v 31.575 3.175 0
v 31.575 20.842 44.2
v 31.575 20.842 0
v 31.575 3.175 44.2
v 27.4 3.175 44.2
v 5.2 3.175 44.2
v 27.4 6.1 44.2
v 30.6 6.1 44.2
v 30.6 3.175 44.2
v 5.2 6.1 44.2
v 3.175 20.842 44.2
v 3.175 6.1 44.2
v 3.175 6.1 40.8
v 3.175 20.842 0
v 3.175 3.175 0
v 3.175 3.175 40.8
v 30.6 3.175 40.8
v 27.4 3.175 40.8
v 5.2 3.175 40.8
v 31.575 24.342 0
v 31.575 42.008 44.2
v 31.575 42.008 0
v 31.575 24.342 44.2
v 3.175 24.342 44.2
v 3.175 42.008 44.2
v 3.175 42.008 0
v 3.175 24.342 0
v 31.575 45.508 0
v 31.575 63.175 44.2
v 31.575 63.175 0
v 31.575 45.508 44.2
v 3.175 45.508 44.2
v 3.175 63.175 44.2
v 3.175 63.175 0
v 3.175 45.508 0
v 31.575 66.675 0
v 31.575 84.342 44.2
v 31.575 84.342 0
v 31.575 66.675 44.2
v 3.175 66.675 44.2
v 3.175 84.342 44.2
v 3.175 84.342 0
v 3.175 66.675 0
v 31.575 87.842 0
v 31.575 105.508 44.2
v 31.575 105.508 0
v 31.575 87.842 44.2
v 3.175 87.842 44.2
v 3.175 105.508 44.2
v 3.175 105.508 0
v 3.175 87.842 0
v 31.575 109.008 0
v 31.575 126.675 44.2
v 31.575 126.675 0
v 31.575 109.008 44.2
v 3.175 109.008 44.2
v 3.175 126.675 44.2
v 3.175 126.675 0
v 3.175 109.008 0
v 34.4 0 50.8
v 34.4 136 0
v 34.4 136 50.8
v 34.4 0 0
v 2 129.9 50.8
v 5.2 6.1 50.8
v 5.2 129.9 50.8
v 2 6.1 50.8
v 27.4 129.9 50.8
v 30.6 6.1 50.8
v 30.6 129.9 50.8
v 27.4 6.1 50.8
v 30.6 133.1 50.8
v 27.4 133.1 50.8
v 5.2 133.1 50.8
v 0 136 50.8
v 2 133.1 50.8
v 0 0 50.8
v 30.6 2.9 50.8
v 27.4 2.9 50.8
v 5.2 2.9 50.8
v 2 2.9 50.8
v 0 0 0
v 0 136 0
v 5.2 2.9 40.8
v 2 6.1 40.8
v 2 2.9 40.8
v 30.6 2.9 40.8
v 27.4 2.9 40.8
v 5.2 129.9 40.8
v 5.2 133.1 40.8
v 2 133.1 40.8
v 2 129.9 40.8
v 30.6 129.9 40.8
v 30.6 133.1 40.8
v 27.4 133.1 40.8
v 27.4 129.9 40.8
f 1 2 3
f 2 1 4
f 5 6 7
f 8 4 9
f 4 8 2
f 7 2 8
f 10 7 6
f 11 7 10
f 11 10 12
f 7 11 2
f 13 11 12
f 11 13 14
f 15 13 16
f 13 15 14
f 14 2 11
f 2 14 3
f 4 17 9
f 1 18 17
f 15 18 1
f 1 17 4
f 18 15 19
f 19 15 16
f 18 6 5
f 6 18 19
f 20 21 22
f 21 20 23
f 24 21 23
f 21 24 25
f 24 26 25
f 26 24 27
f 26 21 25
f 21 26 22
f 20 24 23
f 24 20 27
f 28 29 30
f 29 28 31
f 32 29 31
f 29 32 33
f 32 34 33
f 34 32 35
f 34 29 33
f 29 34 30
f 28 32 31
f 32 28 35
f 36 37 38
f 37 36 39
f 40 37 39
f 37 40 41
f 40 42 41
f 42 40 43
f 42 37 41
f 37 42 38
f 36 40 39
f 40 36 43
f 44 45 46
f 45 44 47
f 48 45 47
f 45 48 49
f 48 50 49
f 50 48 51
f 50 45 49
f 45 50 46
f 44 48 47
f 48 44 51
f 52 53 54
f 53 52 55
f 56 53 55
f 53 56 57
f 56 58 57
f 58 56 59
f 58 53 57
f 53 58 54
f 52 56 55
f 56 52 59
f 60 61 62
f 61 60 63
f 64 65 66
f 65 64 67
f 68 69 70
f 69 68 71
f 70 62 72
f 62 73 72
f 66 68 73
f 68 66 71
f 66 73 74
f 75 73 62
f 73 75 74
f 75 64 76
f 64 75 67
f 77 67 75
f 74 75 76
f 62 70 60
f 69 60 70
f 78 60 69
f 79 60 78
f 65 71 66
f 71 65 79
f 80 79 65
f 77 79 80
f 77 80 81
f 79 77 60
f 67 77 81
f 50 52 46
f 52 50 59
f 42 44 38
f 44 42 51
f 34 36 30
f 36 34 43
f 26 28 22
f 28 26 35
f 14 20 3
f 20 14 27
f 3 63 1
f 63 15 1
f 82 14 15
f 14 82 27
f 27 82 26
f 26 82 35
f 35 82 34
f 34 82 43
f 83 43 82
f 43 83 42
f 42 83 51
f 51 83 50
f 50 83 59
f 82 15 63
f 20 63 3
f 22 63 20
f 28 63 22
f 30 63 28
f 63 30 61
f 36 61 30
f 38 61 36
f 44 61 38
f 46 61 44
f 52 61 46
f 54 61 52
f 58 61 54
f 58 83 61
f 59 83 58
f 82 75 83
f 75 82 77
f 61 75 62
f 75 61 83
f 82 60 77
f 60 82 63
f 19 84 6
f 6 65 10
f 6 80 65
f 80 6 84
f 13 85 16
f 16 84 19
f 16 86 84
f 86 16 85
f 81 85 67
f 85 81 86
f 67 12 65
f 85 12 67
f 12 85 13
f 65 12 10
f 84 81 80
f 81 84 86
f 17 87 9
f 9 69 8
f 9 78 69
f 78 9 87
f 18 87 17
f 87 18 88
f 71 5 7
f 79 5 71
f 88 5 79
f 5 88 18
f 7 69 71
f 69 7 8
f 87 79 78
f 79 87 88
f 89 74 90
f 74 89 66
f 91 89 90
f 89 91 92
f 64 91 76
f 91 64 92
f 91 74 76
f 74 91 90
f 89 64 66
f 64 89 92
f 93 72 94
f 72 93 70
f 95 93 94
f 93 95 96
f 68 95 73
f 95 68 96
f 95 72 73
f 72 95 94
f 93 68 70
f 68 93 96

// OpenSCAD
// Dimensions
compartments = 6;
units = 5;
inch = 25.4;
extra_length = 9; // mm
extra_width = 9;
block_length = units*inch+extra_length; // inches
block_width = 1*inch + extra_width; // inches
block_height = 2*inch; // inches
wallthick = 10;
hole_length = (block_length/compartments) - (wallthick/2) ; // inches
hole_width = (1 * inch)  + (extra_width / 3);
hole_depth = 1.75*inch;
hole_offset = 0.125*inch; // inches
fudge = 0.125*inch;

peg_size = 3.2;
peg_depth = 5;
backpeg_inset = 2 + (peg_size/2); // deal with centering
// Block
difference() {
    cube([block_width, block_length, block_height], center = false);
    
    // Holes
    for (i = [0:compartments-1]) {
        //translate([i * (block_width / 3) - block_width / 2 + hole_offset, -block_length / 2 + hole_offset, 0])
        translate([hole_offset,(((block_length-extra_length) / compartments)*i)+fudge, -0.25]) 
        
        cube([hole_width, hole_length, hole_depth], center = false);
    }
    
    pegx = backpeg_inset;
    pegy = extra_length/2;
    pegz = block_height-peg_depth;
    translate([pegx,pegy,pegz]) cube([peg_size, peg_size, 10], center = true);
    pegxlow = pegx + inch;
    translate([pegxlow,pegy,pegz]) cube([peg_size, peg_size, 10], center = true);
    pegywide = pegy + units * inch;
    translate([pegx,pegywide,pegz]) cube([peg_size, peg_size, 10], center = true);
    translate([pegxlow,pegywide,pegz]) cube([peg_size, peg_size, 10], center = true);
}
